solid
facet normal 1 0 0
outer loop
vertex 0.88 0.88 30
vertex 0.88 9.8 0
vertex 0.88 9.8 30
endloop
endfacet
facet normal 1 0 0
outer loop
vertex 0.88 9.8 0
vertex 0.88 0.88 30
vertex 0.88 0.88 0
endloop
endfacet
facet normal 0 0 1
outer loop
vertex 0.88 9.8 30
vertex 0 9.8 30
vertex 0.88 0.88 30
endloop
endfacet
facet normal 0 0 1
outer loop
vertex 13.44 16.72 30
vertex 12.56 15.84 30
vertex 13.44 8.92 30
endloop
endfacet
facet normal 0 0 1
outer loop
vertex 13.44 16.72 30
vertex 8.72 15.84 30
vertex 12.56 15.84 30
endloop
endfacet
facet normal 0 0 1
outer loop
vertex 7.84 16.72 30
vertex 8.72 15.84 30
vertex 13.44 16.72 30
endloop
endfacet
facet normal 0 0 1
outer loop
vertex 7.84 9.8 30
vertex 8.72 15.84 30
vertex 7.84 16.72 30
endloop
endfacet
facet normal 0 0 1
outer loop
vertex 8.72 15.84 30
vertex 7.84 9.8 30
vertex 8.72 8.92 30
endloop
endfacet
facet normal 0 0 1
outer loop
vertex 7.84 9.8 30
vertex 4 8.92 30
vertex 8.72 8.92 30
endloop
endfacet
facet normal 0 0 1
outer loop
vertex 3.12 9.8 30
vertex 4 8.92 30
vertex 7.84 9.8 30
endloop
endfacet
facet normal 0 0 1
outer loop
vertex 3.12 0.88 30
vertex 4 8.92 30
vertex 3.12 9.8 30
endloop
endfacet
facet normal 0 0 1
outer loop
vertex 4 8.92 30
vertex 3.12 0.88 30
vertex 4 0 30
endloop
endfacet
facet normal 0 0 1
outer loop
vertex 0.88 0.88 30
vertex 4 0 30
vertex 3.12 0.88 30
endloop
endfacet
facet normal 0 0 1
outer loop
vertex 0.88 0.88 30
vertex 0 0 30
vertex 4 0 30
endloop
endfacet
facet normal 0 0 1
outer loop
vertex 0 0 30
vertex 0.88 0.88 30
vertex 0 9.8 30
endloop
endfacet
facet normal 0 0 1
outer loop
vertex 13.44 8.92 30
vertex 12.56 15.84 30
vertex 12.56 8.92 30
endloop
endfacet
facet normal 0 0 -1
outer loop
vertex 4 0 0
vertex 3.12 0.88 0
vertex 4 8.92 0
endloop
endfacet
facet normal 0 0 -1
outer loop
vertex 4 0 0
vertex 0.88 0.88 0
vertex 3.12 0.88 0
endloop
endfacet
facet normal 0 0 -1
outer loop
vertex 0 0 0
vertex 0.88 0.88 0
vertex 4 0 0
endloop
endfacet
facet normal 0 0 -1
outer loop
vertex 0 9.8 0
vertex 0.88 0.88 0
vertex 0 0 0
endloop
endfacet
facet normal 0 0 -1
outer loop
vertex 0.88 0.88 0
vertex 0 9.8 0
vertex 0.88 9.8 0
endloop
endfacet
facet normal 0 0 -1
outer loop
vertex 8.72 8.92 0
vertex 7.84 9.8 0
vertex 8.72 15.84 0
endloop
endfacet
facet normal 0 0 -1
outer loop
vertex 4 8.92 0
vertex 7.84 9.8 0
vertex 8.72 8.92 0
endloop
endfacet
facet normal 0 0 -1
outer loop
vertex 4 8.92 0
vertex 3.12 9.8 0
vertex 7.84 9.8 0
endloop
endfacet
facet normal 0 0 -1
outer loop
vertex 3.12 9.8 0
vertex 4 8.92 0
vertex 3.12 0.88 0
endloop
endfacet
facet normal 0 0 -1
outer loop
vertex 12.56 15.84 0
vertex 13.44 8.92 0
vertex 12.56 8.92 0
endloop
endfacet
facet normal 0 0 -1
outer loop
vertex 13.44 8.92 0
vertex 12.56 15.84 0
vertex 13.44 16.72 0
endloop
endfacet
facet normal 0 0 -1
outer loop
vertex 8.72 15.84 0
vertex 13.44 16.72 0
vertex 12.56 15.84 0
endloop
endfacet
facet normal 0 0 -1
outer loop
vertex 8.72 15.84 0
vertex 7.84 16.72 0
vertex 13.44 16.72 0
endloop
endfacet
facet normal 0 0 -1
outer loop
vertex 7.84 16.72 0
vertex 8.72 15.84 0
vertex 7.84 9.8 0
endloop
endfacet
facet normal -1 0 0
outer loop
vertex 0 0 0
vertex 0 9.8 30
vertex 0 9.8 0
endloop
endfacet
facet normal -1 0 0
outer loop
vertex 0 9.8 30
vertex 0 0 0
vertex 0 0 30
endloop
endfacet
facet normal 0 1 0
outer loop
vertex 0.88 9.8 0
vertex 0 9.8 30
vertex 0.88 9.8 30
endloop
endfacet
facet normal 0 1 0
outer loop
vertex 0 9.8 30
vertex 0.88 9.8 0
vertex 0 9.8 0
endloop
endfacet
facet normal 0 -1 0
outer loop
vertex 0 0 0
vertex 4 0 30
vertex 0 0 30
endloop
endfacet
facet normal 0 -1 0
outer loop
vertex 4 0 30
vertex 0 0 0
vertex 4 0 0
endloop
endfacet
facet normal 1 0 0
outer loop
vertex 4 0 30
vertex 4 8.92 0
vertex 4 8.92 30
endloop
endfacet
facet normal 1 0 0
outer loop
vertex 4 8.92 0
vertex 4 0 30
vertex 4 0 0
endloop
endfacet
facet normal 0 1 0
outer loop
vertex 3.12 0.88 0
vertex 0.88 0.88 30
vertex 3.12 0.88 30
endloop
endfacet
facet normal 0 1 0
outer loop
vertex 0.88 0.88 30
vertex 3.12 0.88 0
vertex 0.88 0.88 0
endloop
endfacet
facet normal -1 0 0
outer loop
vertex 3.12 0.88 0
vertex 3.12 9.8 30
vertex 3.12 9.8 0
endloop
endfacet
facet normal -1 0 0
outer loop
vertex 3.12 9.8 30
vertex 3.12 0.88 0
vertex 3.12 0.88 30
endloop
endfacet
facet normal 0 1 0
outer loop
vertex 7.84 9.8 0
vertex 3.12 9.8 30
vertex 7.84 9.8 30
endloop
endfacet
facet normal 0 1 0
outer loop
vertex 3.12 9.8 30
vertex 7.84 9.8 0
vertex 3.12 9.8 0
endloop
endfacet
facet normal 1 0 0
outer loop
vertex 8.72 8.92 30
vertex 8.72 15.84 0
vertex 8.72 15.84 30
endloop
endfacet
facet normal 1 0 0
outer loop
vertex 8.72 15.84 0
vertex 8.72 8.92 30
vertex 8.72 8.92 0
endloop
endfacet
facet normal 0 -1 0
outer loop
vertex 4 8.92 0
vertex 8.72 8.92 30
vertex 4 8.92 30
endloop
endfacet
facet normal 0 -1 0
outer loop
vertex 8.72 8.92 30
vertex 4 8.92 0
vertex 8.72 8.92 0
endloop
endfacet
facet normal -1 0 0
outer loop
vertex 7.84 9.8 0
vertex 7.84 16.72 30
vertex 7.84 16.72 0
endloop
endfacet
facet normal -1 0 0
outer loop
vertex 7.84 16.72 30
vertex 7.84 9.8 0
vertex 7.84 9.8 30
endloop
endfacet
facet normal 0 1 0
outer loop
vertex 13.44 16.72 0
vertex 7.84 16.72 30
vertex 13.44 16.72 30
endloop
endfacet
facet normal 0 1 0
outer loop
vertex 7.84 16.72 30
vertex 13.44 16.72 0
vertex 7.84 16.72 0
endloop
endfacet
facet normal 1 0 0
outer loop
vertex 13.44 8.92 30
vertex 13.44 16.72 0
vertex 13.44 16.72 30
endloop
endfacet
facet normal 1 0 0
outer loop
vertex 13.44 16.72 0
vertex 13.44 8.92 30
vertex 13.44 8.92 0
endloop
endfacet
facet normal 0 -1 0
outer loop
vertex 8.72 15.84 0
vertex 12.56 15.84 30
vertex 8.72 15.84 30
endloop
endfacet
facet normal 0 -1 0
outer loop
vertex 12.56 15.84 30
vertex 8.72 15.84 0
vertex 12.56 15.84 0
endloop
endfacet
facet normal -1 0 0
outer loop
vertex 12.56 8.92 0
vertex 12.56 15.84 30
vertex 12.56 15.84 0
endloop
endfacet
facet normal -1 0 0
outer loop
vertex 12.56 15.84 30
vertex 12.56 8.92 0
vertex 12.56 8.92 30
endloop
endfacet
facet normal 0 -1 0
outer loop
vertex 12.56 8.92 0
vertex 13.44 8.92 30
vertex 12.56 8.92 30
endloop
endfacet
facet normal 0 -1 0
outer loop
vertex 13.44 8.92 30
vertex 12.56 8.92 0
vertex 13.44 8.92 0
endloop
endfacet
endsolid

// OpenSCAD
/*
 * Vitavia Target Greenhouse Panes Holder 1302
 *
 * Author: Pavel Rampas
 * Version: 1.0.0 (Changelog is at the bottom)
 * License: CC BY-SA 4.0 [https://creativecommons.org/licenses/by-sa/4.0/]
 * Link: https://github.com/pavelrampas/openscad-models
 *
 * OpenSCAD version: 2021.01
 *
 * Instructions:
 * Set up parameters, render and print.
 *
 * Height is layer.
 * Thickness is perimeter.
 */

// Parameters
//------------------------------------------------------------------------------

$fn = $preview ? 15 : 90;

thickness = 0.88;
height = 30;

sizeA = 9.8;
sizeB = 4.0;
sizeC = 9.8;
sizeD = 5.6;
sizeE = 7.8;
sizeF = 5.6;
sizeG = 7.8;

// Code
//------------------------------------------------------------------------------

cube([thickness, sizeA, height]);

cube([sizeB, thickness, height]);

translate([sizeB - thickness, 0, 0]) {
    cube([thickness, sizeC, height]);
}

translate([sizeB - thickness, sizeC - thickness, 0]) {
    cube([sizeD, thickness, height]);
}

translate([(sizeB + sizeD) - (2 * thickness), sizeC - thickness, 0]) {
    cube([thickness, sizeE, height]);
}

translate([
    (sizeB + sizeD) - (2 * thickness),
    (sizeC + sizeE) - (thickness * 2),
    0
]) {
    cube([sizeF, thickness, height]);
}

translate([
    (sizeB + sizeD + sizeF) - (3 * thickness),
    (sizeC + (sizeE - sizeG)) - thickness,
    0
]) {
    cube([thickness, sizeG, height]);
}

// Functions
//------------------------------------------------------------------------------

// Modules
//------------------------------------------------------------------------------

// Changelog
//------------------------------------------------------------------------------

// [1.0.0]:
// Initial release.
